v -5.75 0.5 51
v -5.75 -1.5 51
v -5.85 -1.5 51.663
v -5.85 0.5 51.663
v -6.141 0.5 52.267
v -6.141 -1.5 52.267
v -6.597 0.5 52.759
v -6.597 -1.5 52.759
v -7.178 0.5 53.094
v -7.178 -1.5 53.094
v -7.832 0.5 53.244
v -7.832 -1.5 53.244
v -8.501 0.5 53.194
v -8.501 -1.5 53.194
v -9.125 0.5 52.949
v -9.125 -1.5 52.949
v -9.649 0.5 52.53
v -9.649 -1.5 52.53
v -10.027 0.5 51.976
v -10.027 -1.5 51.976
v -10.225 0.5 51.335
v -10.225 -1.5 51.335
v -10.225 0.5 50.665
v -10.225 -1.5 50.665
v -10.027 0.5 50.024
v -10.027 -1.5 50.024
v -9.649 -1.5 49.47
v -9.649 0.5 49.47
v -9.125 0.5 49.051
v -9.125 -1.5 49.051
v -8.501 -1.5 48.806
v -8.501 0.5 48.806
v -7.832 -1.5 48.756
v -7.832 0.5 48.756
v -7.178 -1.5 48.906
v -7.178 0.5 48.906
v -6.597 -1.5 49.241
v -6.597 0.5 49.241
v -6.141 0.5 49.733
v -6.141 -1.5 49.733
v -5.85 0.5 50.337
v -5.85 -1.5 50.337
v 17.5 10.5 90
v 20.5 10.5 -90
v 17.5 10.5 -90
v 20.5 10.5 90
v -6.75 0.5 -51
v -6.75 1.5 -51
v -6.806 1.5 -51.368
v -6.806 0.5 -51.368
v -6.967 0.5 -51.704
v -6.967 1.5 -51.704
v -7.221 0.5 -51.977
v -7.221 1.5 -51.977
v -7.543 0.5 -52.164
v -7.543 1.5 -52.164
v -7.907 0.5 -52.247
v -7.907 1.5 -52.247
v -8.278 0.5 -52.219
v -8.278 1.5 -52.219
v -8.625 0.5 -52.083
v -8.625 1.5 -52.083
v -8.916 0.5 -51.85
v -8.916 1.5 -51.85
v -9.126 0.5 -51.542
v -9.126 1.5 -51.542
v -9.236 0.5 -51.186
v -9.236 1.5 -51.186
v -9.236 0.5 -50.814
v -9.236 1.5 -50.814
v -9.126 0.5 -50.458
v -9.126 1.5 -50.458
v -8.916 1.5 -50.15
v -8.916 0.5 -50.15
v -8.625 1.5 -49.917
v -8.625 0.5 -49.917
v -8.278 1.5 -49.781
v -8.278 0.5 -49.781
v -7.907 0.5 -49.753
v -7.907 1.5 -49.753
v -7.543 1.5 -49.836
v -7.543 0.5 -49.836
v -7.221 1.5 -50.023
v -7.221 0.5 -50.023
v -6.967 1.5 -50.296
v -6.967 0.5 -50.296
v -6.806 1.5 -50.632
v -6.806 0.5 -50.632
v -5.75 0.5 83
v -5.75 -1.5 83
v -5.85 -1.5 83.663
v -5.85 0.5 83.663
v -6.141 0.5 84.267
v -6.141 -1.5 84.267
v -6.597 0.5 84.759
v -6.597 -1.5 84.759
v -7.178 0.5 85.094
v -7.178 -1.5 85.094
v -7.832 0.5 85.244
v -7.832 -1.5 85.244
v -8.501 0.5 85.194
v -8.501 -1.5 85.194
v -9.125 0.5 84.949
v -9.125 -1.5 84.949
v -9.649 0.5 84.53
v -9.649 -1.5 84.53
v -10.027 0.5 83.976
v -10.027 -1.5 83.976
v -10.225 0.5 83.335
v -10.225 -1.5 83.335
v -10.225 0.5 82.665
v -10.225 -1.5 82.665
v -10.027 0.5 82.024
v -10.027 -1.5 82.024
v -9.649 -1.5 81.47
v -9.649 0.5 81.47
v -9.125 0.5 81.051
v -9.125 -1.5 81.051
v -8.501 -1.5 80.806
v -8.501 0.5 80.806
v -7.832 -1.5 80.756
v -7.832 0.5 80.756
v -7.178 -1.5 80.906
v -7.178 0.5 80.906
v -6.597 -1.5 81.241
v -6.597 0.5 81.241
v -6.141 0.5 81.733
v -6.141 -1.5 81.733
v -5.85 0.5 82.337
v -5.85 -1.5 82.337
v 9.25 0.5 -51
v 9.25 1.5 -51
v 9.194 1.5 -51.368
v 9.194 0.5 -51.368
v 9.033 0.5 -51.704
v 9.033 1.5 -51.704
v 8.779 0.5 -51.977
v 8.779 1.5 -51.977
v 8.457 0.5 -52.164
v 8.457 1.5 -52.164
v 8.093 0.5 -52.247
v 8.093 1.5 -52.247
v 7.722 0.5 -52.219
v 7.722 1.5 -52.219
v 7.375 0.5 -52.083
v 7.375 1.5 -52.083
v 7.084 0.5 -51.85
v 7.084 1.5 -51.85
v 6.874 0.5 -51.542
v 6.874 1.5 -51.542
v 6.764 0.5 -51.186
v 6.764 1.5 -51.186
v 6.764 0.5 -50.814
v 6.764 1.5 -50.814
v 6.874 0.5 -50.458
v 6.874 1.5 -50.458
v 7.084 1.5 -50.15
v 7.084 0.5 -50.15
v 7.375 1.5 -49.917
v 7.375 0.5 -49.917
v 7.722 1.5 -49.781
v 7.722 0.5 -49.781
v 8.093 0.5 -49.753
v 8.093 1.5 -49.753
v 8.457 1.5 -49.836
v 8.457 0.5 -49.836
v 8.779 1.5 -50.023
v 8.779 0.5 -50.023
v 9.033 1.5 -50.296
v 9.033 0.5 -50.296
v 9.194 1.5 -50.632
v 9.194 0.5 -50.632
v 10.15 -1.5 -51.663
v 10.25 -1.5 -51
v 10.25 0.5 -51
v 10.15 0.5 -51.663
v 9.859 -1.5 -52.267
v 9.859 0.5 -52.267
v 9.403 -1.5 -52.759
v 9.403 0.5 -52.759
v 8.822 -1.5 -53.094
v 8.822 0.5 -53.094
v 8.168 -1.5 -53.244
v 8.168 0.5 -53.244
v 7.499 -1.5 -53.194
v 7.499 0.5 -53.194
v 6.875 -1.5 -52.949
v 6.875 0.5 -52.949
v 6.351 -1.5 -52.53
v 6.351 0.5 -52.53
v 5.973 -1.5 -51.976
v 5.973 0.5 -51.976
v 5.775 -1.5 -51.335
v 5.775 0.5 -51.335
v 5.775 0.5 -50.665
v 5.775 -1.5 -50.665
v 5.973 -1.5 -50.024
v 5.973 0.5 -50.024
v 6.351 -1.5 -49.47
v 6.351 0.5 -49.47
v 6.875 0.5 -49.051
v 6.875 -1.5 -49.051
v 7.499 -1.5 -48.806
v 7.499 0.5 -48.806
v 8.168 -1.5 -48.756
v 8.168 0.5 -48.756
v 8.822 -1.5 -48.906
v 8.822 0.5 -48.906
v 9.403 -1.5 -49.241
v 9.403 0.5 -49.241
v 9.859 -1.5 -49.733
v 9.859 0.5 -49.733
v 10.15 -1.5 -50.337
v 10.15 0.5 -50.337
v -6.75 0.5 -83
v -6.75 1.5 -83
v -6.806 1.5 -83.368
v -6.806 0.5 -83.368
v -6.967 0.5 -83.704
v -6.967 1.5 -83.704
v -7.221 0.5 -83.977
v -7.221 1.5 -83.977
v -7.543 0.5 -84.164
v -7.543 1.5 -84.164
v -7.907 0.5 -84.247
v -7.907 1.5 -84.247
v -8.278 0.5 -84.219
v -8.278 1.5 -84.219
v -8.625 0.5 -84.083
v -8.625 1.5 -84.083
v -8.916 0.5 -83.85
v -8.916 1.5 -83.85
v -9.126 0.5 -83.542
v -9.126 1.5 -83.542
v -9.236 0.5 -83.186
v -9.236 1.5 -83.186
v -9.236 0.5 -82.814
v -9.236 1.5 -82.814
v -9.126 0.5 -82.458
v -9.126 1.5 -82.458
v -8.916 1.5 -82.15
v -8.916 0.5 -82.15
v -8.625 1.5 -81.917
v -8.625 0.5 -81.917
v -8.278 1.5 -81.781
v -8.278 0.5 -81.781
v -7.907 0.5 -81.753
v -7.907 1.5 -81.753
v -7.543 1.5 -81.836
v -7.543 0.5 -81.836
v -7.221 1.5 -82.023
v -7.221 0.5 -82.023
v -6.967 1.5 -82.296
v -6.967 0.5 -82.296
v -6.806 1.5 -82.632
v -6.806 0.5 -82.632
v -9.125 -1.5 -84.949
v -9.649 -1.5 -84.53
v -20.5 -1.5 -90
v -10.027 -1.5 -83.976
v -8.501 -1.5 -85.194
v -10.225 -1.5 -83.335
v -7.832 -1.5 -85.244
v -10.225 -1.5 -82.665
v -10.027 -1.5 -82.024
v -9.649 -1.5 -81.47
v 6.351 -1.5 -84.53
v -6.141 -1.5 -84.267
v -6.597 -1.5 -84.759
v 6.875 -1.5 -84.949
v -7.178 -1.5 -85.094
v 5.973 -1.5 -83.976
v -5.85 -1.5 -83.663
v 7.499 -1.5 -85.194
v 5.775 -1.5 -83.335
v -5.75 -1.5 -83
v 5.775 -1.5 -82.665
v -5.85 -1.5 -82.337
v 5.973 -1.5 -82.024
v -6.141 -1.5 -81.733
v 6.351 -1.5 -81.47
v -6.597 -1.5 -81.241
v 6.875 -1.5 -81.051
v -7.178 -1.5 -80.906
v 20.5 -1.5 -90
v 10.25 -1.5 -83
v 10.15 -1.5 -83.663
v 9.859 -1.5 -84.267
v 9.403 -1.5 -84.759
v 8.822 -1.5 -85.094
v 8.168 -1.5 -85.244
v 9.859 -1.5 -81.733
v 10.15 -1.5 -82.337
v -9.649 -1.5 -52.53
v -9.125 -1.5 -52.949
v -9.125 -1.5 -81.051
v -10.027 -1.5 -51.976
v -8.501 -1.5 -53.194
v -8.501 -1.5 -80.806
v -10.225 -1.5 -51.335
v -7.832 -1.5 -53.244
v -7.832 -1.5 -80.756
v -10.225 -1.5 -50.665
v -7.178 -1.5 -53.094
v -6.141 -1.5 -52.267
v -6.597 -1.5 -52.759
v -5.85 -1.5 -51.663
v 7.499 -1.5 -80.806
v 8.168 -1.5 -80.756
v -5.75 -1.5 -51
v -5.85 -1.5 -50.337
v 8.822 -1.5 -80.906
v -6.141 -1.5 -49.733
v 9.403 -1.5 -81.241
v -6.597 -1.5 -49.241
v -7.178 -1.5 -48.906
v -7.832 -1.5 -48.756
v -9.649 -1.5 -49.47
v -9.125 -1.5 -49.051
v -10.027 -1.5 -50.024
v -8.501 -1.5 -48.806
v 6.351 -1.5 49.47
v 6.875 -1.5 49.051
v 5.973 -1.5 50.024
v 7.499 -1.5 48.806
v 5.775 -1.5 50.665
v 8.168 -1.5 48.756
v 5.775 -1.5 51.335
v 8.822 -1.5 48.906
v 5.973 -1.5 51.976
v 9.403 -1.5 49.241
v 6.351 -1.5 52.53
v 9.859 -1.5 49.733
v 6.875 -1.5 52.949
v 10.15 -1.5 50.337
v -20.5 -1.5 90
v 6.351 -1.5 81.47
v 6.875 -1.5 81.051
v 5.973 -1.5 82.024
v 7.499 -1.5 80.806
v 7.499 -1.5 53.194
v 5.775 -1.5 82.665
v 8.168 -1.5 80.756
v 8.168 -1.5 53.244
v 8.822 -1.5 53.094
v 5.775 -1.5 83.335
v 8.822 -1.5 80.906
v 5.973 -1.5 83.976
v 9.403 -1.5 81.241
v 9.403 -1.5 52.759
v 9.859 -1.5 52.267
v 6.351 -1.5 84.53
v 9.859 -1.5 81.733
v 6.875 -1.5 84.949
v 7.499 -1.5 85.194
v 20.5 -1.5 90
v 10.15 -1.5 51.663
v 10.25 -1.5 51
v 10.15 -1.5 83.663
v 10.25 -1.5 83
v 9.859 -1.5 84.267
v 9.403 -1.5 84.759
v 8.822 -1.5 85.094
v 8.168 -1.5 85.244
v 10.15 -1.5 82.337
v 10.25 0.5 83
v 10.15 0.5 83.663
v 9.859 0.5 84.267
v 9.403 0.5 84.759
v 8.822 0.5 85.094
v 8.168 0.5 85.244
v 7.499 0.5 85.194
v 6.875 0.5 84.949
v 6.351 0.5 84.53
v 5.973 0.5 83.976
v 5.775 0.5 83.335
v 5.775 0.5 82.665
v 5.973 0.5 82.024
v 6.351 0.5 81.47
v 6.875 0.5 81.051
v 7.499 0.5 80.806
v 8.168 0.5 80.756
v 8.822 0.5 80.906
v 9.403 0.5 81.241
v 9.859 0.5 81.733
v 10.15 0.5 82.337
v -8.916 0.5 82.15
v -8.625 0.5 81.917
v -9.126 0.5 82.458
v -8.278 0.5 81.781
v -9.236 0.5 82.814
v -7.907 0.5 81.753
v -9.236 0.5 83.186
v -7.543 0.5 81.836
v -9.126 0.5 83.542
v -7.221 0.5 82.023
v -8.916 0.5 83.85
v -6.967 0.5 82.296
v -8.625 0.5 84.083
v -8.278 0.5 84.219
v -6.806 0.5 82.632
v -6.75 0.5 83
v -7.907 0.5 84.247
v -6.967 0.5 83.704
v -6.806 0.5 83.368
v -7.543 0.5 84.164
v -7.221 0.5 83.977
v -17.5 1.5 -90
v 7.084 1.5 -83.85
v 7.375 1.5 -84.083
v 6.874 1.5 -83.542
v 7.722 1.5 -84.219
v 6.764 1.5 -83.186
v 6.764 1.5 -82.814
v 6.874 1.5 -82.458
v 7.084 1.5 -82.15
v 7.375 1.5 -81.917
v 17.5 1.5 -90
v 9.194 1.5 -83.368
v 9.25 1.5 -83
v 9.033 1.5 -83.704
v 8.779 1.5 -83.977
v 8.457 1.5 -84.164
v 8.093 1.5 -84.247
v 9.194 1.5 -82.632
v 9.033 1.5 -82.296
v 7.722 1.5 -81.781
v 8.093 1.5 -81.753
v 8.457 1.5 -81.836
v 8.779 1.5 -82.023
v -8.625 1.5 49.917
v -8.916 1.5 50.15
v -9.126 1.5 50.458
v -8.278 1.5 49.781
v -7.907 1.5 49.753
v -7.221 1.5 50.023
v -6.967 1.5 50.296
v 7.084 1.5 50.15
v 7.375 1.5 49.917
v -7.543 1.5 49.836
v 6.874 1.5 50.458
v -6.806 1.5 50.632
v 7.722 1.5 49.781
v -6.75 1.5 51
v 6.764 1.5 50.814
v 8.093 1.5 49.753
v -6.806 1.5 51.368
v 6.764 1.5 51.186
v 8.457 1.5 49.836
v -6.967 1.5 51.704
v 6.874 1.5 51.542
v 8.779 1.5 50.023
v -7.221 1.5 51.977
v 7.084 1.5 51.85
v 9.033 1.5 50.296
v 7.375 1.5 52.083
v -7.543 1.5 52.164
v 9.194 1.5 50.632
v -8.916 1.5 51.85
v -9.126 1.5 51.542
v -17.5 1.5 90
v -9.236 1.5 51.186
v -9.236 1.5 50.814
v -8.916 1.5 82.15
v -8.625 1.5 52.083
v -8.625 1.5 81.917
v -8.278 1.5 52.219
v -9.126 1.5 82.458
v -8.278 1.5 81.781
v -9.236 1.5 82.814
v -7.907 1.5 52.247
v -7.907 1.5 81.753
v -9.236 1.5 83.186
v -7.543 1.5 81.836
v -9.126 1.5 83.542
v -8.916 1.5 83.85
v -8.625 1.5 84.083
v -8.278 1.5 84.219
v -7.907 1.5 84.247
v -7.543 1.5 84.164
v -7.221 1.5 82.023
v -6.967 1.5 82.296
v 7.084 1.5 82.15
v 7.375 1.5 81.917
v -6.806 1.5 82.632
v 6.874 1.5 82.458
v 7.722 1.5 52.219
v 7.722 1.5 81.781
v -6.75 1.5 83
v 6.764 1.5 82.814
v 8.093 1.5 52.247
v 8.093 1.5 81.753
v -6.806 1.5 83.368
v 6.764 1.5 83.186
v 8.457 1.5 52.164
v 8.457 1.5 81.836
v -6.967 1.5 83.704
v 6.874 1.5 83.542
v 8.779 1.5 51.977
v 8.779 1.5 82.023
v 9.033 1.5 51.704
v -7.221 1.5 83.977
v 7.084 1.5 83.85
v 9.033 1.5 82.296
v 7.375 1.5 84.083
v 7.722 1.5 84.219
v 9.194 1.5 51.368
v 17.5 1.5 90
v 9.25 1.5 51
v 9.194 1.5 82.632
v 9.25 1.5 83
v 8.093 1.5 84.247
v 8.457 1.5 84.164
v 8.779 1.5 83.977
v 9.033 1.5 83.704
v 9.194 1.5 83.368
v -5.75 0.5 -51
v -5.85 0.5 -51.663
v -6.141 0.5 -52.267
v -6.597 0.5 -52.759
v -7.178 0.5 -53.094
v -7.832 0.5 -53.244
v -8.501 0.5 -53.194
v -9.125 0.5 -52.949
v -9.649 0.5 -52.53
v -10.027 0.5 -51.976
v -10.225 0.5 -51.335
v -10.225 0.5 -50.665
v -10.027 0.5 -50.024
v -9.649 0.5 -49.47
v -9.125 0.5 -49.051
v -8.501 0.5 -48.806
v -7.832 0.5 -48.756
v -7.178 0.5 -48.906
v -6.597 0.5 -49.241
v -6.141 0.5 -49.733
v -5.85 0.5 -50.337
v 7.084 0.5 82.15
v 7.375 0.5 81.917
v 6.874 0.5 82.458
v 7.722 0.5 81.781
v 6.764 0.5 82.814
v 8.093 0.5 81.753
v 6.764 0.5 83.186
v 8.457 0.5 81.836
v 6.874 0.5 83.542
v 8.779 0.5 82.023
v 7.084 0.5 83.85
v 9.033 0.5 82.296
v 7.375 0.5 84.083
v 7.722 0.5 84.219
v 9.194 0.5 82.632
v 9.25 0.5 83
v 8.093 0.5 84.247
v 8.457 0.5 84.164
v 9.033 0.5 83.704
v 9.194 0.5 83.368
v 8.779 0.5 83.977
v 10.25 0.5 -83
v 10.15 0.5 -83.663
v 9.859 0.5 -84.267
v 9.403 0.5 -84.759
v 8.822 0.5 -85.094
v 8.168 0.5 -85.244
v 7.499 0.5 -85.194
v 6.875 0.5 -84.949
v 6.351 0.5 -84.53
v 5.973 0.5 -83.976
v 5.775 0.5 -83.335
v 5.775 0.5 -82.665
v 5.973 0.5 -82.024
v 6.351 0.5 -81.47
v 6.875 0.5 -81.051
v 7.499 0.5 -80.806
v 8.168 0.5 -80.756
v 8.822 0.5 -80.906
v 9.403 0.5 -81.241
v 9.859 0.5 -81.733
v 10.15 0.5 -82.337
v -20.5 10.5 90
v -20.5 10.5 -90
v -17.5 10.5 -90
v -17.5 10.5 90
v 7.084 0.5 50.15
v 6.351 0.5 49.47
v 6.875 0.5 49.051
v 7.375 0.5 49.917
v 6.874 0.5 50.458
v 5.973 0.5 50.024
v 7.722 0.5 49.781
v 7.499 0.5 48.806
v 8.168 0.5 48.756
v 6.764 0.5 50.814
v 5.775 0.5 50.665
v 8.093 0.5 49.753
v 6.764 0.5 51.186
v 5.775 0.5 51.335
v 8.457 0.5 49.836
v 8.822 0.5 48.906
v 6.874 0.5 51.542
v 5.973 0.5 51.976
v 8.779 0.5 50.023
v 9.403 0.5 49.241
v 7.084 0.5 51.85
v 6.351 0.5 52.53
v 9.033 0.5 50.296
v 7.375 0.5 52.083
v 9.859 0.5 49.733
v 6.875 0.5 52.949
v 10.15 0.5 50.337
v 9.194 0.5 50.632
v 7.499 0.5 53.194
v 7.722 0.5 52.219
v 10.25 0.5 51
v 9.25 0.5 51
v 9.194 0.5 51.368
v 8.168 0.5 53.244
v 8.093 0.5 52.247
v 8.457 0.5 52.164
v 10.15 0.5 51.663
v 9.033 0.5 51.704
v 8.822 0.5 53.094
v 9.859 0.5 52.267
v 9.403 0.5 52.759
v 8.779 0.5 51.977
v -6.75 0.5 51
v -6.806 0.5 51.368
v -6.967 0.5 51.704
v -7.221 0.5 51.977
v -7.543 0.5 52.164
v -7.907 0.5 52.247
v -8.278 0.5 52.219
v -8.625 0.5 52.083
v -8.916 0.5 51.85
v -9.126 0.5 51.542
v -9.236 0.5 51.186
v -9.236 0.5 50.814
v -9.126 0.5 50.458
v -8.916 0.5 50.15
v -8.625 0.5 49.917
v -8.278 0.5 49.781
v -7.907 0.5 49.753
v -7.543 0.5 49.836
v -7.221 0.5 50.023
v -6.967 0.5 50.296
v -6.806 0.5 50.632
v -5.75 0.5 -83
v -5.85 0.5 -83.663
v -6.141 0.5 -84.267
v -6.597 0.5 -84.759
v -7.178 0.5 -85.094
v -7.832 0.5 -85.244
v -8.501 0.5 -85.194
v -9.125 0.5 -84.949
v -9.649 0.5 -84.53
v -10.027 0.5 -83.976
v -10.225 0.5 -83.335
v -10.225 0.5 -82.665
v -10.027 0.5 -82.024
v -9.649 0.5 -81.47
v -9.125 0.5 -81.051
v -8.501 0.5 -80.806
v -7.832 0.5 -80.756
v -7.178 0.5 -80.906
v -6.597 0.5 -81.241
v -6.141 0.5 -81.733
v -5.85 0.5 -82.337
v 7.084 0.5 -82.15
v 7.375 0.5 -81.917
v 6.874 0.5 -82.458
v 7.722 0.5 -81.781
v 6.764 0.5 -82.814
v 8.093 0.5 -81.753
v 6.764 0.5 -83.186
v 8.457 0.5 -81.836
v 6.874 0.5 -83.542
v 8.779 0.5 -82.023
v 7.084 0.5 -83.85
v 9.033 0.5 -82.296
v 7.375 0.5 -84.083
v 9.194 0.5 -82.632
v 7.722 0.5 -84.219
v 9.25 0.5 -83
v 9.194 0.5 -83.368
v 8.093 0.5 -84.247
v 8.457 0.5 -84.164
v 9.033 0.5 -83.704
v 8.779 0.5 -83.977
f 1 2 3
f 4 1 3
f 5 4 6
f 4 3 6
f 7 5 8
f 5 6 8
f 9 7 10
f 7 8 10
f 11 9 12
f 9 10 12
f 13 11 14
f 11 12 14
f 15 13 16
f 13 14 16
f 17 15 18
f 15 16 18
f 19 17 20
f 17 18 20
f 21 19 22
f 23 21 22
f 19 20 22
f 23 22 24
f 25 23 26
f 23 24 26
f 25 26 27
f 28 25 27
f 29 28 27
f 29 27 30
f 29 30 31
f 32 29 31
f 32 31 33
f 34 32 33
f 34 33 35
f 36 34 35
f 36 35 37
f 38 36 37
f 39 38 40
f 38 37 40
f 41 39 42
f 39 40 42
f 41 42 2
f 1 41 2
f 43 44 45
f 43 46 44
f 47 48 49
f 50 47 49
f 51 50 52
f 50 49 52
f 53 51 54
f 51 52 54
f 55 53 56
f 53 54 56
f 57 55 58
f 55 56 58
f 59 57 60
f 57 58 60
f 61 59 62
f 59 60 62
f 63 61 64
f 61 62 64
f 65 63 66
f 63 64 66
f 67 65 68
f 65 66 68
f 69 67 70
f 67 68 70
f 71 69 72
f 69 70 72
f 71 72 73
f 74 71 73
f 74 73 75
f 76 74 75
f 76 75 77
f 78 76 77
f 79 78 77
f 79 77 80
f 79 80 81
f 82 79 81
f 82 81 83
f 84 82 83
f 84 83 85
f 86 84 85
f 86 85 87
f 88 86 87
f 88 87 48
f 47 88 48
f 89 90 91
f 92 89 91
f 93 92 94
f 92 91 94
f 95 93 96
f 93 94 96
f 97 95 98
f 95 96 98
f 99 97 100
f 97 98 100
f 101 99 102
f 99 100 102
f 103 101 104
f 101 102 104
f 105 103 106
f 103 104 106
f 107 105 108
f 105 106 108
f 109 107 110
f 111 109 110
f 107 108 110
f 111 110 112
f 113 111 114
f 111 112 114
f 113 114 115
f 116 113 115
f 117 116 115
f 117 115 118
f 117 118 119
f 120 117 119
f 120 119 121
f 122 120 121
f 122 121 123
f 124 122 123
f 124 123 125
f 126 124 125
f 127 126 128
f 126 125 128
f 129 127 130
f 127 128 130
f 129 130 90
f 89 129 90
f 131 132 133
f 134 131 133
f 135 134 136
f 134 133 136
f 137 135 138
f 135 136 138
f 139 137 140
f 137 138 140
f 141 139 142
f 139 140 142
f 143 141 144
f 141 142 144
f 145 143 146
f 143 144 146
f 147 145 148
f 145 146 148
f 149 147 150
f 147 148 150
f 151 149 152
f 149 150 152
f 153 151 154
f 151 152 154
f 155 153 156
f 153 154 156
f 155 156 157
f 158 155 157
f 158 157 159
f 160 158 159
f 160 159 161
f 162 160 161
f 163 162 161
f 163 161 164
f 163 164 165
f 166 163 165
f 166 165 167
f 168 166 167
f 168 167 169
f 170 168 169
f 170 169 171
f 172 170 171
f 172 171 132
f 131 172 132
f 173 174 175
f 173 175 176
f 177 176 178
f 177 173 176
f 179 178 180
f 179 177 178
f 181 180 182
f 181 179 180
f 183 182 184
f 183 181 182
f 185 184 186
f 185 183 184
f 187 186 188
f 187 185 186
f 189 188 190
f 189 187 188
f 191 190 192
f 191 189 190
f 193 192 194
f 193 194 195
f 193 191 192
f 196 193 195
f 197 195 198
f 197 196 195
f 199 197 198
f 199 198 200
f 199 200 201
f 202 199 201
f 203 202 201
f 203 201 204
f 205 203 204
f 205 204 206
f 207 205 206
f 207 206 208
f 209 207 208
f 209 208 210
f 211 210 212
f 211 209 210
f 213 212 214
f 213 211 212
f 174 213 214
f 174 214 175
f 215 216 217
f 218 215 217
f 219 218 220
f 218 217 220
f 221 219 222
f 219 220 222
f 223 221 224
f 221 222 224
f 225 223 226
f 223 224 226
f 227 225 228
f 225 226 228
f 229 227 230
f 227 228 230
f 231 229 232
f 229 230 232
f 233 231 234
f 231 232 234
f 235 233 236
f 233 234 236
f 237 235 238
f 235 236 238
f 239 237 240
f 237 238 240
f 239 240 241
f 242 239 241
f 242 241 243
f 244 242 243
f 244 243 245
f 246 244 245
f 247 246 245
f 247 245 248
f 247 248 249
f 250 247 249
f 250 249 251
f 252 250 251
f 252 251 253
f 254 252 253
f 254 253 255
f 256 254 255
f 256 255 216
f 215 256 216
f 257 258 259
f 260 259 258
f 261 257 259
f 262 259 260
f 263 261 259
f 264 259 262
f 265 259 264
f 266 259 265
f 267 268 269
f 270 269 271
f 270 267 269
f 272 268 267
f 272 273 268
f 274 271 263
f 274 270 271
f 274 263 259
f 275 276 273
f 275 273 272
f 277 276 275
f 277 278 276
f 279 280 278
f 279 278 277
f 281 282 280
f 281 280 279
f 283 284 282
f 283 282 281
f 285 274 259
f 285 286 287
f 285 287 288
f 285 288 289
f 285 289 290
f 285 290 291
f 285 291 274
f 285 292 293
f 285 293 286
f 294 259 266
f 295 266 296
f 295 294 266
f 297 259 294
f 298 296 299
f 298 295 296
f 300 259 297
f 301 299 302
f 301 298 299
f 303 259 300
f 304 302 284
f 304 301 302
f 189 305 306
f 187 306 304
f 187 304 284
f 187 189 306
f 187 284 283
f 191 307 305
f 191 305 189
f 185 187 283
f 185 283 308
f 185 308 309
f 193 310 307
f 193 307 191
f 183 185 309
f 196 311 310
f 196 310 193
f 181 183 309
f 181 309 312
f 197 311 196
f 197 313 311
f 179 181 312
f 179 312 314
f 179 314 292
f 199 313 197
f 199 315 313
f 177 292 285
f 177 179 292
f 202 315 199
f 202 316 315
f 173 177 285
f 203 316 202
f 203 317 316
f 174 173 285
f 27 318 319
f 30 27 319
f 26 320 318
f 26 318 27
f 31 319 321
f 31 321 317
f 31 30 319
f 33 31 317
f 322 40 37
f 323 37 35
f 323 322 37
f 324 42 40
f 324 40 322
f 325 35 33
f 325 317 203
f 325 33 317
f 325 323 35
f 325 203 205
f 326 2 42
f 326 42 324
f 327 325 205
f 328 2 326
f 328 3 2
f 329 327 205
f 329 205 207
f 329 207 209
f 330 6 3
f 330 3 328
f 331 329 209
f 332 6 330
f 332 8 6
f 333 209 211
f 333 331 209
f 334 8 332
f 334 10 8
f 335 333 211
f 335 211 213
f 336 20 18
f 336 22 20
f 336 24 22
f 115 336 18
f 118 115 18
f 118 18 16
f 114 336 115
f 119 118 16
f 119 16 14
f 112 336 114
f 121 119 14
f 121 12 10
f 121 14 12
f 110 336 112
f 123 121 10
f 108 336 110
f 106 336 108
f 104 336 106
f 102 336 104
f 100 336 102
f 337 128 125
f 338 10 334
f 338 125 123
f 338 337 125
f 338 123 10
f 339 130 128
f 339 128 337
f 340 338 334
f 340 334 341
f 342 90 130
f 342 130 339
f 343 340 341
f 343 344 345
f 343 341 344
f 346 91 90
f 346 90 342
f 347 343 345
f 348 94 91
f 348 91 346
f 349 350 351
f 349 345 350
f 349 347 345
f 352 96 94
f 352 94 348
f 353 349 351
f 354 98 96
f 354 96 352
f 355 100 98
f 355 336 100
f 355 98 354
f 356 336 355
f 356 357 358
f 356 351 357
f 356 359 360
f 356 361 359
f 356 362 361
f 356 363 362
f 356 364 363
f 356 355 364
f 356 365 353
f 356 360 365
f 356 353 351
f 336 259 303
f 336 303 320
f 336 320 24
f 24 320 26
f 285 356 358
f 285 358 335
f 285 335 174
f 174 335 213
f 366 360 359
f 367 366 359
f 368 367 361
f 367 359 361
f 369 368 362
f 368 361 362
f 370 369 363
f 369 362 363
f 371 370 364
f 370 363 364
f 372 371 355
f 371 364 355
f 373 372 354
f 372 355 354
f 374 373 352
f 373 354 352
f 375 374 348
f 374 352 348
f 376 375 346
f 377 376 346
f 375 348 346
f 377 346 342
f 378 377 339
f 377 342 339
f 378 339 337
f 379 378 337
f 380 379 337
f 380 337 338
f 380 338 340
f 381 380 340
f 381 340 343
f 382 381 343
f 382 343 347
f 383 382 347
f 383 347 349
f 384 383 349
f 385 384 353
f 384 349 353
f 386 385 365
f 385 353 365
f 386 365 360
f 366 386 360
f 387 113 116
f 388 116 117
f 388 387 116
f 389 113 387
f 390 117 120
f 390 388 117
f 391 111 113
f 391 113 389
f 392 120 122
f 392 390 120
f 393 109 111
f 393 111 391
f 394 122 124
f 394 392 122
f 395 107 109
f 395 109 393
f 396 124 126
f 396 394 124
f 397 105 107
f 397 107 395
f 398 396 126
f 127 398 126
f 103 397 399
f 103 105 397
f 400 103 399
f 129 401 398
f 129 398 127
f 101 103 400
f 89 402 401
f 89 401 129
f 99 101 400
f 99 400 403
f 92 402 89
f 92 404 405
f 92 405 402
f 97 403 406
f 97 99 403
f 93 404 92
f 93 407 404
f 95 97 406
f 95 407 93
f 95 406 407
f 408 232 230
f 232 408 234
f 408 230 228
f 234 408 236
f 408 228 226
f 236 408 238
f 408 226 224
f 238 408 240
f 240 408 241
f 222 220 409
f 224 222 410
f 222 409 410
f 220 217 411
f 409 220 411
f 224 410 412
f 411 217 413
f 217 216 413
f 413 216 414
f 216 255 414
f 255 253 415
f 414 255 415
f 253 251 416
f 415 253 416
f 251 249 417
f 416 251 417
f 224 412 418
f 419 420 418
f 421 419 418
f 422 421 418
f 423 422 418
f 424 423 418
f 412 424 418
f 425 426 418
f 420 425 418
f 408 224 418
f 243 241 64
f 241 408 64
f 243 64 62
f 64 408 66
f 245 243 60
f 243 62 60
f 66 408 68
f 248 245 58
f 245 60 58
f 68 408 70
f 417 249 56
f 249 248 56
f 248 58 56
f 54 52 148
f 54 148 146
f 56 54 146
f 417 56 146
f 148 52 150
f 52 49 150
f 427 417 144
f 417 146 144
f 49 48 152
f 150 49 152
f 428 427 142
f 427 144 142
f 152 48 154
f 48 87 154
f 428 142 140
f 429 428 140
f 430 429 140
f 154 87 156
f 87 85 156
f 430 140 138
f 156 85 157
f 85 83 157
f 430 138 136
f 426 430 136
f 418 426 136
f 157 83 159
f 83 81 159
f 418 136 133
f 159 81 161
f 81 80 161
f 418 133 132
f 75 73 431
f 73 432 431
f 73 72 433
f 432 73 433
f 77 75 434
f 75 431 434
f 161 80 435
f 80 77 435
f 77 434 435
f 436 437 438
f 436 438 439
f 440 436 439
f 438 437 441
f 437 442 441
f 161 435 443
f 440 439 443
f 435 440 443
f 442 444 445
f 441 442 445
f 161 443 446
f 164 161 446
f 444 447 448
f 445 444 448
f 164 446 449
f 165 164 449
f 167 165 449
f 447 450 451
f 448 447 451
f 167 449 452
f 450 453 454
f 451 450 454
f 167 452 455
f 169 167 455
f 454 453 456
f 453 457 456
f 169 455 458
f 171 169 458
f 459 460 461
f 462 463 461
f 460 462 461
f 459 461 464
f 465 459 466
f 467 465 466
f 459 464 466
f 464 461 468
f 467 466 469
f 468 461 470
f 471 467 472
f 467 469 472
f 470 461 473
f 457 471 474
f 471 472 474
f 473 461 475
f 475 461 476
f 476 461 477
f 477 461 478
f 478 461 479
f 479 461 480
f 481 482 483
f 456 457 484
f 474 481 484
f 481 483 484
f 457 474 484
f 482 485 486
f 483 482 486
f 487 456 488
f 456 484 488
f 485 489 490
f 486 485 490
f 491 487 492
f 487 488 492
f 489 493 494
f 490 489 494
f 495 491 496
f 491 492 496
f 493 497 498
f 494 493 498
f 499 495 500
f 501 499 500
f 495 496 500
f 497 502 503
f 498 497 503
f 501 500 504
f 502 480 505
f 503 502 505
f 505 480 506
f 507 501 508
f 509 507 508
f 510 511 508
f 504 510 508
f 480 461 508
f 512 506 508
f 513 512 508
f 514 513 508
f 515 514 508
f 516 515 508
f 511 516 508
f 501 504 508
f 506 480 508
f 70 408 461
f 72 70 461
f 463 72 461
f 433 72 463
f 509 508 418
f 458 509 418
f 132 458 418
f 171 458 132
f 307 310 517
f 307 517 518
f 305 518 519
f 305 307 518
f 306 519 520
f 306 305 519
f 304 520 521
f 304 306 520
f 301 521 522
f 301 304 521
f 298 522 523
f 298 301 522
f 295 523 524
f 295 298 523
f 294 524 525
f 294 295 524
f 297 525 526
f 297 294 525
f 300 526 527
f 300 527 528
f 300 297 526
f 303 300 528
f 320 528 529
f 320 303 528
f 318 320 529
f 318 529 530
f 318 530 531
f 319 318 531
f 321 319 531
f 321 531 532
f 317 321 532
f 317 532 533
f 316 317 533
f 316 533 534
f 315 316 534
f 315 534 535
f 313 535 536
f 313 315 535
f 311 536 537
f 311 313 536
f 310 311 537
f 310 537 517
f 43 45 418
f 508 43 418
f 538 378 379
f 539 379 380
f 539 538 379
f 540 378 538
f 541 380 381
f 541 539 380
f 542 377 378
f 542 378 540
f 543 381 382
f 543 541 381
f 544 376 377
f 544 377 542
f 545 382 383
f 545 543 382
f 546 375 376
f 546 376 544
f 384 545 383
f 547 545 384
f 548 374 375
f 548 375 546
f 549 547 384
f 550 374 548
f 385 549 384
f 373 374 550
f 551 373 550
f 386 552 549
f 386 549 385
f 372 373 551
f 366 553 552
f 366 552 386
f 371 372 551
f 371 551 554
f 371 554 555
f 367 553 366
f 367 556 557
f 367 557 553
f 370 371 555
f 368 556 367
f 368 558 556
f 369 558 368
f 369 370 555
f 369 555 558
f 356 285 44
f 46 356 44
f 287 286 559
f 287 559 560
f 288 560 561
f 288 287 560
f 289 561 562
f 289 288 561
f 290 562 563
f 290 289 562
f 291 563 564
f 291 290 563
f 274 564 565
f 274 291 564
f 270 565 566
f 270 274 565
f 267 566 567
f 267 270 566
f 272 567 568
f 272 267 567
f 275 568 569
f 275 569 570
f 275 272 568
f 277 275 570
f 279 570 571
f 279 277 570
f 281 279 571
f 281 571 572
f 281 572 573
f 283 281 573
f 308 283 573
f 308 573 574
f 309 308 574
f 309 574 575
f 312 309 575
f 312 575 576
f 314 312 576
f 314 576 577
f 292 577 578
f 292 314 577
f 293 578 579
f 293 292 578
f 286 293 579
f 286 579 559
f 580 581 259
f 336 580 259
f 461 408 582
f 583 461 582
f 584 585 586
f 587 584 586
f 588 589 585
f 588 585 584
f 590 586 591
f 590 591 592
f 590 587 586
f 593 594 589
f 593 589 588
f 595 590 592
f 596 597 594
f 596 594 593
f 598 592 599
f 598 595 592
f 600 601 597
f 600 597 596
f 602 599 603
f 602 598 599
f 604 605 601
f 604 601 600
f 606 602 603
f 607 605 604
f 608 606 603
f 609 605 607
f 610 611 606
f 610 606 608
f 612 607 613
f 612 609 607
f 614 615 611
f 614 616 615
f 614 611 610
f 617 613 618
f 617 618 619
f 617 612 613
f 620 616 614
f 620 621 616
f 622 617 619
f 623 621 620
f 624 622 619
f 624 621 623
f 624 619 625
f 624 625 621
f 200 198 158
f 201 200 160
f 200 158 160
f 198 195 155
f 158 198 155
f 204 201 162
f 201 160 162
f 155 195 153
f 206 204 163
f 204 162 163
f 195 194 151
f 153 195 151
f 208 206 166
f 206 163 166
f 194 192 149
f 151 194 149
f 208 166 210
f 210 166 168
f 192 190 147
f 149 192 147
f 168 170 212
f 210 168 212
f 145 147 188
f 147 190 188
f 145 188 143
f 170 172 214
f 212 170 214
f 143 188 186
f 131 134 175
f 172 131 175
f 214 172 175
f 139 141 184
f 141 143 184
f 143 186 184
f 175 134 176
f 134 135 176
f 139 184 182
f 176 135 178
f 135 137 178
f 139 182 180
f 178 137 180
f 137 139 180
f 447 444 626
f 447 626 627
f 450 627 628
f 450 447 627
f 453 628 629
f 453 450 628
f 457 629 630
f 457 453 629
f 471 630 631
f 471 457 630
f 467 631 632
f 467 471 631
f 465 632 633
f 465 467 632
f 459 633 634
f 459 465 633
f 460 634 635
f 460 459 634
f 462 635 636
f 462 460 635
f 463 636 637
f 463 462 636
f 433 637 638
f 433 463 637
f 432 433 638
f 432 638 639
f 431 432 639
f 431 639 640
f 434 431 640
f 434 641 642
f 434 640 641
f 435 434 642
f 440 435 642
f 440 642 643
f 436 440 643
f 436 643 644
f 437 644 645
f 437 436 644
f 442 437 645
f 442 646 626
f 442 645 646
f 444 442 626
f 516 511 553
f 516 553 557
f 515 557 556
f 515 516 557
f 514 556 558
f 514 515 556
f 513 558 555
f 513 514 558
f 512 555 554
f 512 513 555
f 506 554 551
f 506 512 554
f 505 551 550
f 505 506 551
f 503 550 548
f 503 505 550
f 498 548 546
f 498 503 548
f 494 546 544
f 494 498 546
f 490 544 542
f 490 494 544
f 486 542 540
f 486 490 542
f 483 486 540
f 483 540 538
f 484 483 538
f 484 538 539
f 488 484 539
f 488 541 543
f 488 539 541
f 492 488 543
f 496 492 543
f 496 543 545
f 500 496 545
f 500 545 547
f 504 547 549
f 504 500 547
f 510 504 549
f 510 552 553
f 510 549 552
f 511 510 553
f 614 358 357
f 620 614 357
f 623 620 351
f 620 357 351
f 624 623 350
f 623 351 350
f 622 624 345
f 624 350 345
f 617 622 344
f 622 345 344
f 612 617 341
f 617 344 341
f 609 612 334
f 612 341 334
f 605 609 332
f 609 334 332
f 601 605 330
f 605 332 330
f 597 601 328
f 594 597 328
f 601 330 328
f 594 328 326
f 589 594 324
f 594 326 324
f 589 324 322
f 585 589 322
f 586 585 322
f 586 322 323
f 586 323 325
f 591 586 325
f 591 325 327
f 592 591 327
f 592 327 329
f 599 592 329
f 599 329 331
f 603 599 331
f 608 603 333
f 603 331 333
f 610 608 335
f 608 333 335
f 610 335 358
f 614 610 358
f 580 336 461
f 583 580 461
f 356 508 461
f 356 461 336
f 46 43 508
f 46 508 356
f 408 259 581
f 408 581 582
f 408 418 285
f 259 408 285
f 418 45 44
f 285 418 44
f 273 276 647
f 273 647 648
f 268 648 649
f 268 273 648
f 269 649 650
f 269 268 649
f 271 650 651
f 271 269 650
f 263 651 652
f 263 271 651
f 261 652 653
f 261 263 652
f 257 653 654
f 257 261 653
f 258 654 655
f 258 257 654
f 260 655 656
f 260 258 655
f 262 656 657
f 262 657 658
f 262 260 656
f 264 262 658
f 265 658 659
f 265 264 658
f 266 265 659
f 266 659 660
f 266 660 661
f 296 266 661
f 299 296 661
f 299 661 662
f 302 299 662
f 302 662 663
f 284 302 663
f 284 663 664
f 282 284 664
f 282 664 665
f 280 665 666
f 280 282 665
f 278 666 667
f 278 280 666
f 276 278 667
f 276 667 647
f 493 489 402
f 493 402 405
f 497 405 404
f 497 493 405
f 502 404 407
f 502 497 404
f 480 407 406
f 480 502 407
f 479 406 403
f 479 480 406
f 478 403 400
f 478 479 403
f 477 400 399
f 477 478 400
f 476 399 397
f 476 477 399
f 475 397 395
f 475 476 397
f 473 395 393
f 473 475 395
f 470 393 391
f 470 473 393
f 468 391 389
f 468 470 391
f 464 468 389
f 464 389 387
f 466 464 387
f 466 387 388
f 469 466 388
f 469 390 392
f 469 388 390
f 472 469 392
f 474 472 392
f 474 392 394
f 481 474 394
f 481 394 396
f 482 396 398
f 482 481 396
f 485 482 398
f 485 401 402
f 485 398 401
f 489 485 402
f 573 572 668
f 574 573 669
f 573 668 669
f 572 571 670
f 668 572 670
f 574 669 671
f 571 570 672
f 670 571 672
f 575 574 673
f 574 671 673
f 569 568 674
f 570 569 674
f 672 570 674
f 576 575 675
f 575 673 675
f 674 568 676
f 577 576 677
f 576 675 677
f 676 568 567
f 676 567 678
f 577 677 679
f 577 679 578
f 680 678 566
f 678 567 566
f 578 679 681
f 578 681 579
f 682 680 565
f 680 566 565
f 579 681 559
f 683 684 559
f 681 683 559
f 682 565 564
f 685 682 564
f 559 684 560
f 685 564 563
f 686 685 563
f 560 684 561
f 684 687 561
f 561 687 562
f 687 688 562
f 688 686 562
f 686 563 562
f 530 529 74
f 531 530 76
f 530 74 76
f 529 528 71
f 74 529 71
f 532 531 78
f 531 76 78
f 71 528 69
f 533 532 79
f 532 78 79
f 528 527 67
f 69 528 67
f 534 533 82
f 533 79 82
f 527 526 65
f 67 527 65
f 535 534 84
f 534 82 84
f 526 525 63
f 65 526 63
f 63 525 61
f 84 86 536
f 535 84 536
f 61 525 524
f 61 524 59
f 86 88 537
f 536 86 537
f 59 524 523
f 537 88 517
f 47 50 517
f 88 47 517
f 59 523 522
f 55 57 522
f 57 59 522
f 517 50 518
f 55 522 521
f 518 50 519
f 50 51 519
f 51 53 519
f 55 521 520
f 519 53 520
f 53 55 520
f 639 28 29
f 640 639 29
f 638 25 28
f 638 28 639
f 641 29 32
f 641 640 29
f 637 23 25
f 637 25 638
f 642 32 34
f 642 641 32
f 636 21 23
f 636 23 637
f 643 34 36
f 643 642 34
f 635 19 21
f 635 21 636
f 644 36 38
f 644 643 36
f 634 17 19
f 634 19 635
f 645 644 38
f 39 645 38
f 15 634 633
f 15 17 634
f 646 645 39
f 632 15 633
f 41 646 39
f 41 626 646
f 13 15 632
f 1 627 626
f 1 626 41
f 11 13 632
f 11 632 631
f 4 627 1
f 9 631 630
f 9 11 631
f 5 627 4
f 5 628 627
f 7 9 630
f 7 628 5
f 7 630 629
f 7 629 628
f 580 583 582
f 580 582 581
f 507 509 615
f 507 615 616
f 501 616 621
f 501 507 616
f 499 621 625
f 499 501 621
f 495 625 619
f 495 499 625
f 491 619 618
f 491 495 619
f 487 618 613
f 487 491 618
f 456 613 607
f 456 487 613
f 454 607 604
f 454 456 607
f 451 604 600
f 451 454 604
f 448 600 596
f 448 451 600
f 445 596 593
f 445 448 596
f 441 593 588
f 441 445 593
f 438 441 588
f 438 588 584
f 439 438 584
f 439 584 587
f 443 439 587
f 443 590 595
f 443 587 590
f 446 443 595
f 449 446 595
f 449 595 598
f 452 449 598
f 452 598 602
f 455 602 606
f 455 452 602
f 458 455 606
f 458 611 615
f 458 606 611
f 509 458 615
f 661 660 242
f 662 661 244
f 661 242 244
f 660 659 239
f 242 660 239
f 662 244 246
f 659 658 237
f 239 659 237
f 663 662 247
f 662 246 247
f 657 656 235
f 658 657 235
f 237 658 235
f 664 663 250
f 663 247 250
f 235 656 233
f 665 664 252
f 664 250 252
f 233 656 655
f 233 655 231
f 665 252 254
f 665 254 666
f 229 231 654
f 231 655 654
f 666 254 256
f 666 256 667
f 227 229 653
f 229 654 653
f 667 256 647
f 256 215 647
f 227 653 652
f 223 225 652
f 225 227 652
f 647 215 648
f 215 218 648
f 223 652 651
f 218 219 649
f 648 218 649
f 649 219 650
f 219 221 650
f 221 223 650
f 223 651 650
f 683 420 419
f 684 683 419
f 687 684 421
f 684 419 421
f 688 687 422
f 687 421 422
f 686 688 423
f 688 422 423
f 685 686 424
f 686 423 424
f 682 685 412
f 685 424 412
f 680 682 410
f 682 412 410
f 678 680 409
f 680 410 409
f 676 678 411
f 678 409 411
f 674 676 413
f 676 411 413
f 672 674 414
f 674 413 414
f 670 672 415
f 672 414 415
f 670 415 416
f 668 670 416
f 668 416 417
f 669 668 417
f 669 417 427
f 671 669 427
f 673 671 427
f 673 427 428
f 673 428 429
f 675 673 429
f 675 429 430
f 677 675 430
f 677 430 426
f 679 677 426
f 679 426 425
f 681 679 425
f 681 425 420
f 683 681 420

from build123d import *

# Parameters (mm, degrees)
SKETCH2_W           = 35
SKETCH2_H           = 3
BOSS_EXTRUDE1_DEPTH = 90
CUT_EXTRUDE1_START  = -13
SKETCH3_R           = 1.25
CUT_EXTRUDE1_DEPTH  = 14
SKETCH4_R           = 2.25
CUT_EXTRUDE2_DEPTH  = 2


with BuildPart() as part:
    # Sketch2 → Boss-Extrude1 (new body)
    with BuildSketch(Plane.XY):
        Polygon((17.5, 10.5), (17.5, 1.5), (17.5, -1.5), (20.5, -1.5), (20.5, 10.5), align=None)
        Rectangle(SKETCH2_W, SKETCH2_H)
        Polygon((-17.5, -1.5), (-17.5, 1.5), (-17.5, 10.5), (-20.5, 10.5), (-20.5, -1.5), align=None)
    boss_extrude1 = extrude(amount=BOSS_EXTRUDE1_DEPTH)

    # Sketch3 → Cut-Extrude1 (cut)
    with BuildSketch(Plane.XZ.offset(1.5).offset(CUT_EXTRUDE1_START)):
        with Locations((-8, 83)):
            Circle(SKETCH3_R)
        with Locations((8, 83)):
            Circle(SKETCH3_R)
        with Locations((8, 51)):
            Circle(SKETCH3_R)
        with Locations((-8, 51)):
            Circle(SKETCH3_R)
    cut_extrude1 = extrude(amount=CUT_EXTRUDE1_DEPTH, mode=Mode.SUBTRACT)

    # Sketch4 → Cut-Extrude2 (cut)
    with BuildSketch(Plane.XZ.offset(1.5)):
        with Locations((-8, 83)):
            Circle(SKETCH4_R)
        with Locations((8, 83)):
            Circle(SKETCH4_R)
        with Locations((8, 51)):
            Circle(SKETCH4_R)
        with Locations((-8, 51)):
            Circle(SKETCH4_R)
    cut_extrude2 = extrude(amount=-CUT_EXTRUDE2_DEPTH, mode=Mode.SUBTRACT)

    # Mirror1: Boss-Extrude1, Cut-Extrude1, Cut-Extrude2 across plane
    add(boss_extrude1.mirror(Plane.XY))
    add(cut_extrude1.mirror(Plane.XY), mode=Mode.SUBTRACT)
    add(cut_extrude2.mirror(Plane.XY), mode=Mode.SUBTRACT)


solid = part.part
